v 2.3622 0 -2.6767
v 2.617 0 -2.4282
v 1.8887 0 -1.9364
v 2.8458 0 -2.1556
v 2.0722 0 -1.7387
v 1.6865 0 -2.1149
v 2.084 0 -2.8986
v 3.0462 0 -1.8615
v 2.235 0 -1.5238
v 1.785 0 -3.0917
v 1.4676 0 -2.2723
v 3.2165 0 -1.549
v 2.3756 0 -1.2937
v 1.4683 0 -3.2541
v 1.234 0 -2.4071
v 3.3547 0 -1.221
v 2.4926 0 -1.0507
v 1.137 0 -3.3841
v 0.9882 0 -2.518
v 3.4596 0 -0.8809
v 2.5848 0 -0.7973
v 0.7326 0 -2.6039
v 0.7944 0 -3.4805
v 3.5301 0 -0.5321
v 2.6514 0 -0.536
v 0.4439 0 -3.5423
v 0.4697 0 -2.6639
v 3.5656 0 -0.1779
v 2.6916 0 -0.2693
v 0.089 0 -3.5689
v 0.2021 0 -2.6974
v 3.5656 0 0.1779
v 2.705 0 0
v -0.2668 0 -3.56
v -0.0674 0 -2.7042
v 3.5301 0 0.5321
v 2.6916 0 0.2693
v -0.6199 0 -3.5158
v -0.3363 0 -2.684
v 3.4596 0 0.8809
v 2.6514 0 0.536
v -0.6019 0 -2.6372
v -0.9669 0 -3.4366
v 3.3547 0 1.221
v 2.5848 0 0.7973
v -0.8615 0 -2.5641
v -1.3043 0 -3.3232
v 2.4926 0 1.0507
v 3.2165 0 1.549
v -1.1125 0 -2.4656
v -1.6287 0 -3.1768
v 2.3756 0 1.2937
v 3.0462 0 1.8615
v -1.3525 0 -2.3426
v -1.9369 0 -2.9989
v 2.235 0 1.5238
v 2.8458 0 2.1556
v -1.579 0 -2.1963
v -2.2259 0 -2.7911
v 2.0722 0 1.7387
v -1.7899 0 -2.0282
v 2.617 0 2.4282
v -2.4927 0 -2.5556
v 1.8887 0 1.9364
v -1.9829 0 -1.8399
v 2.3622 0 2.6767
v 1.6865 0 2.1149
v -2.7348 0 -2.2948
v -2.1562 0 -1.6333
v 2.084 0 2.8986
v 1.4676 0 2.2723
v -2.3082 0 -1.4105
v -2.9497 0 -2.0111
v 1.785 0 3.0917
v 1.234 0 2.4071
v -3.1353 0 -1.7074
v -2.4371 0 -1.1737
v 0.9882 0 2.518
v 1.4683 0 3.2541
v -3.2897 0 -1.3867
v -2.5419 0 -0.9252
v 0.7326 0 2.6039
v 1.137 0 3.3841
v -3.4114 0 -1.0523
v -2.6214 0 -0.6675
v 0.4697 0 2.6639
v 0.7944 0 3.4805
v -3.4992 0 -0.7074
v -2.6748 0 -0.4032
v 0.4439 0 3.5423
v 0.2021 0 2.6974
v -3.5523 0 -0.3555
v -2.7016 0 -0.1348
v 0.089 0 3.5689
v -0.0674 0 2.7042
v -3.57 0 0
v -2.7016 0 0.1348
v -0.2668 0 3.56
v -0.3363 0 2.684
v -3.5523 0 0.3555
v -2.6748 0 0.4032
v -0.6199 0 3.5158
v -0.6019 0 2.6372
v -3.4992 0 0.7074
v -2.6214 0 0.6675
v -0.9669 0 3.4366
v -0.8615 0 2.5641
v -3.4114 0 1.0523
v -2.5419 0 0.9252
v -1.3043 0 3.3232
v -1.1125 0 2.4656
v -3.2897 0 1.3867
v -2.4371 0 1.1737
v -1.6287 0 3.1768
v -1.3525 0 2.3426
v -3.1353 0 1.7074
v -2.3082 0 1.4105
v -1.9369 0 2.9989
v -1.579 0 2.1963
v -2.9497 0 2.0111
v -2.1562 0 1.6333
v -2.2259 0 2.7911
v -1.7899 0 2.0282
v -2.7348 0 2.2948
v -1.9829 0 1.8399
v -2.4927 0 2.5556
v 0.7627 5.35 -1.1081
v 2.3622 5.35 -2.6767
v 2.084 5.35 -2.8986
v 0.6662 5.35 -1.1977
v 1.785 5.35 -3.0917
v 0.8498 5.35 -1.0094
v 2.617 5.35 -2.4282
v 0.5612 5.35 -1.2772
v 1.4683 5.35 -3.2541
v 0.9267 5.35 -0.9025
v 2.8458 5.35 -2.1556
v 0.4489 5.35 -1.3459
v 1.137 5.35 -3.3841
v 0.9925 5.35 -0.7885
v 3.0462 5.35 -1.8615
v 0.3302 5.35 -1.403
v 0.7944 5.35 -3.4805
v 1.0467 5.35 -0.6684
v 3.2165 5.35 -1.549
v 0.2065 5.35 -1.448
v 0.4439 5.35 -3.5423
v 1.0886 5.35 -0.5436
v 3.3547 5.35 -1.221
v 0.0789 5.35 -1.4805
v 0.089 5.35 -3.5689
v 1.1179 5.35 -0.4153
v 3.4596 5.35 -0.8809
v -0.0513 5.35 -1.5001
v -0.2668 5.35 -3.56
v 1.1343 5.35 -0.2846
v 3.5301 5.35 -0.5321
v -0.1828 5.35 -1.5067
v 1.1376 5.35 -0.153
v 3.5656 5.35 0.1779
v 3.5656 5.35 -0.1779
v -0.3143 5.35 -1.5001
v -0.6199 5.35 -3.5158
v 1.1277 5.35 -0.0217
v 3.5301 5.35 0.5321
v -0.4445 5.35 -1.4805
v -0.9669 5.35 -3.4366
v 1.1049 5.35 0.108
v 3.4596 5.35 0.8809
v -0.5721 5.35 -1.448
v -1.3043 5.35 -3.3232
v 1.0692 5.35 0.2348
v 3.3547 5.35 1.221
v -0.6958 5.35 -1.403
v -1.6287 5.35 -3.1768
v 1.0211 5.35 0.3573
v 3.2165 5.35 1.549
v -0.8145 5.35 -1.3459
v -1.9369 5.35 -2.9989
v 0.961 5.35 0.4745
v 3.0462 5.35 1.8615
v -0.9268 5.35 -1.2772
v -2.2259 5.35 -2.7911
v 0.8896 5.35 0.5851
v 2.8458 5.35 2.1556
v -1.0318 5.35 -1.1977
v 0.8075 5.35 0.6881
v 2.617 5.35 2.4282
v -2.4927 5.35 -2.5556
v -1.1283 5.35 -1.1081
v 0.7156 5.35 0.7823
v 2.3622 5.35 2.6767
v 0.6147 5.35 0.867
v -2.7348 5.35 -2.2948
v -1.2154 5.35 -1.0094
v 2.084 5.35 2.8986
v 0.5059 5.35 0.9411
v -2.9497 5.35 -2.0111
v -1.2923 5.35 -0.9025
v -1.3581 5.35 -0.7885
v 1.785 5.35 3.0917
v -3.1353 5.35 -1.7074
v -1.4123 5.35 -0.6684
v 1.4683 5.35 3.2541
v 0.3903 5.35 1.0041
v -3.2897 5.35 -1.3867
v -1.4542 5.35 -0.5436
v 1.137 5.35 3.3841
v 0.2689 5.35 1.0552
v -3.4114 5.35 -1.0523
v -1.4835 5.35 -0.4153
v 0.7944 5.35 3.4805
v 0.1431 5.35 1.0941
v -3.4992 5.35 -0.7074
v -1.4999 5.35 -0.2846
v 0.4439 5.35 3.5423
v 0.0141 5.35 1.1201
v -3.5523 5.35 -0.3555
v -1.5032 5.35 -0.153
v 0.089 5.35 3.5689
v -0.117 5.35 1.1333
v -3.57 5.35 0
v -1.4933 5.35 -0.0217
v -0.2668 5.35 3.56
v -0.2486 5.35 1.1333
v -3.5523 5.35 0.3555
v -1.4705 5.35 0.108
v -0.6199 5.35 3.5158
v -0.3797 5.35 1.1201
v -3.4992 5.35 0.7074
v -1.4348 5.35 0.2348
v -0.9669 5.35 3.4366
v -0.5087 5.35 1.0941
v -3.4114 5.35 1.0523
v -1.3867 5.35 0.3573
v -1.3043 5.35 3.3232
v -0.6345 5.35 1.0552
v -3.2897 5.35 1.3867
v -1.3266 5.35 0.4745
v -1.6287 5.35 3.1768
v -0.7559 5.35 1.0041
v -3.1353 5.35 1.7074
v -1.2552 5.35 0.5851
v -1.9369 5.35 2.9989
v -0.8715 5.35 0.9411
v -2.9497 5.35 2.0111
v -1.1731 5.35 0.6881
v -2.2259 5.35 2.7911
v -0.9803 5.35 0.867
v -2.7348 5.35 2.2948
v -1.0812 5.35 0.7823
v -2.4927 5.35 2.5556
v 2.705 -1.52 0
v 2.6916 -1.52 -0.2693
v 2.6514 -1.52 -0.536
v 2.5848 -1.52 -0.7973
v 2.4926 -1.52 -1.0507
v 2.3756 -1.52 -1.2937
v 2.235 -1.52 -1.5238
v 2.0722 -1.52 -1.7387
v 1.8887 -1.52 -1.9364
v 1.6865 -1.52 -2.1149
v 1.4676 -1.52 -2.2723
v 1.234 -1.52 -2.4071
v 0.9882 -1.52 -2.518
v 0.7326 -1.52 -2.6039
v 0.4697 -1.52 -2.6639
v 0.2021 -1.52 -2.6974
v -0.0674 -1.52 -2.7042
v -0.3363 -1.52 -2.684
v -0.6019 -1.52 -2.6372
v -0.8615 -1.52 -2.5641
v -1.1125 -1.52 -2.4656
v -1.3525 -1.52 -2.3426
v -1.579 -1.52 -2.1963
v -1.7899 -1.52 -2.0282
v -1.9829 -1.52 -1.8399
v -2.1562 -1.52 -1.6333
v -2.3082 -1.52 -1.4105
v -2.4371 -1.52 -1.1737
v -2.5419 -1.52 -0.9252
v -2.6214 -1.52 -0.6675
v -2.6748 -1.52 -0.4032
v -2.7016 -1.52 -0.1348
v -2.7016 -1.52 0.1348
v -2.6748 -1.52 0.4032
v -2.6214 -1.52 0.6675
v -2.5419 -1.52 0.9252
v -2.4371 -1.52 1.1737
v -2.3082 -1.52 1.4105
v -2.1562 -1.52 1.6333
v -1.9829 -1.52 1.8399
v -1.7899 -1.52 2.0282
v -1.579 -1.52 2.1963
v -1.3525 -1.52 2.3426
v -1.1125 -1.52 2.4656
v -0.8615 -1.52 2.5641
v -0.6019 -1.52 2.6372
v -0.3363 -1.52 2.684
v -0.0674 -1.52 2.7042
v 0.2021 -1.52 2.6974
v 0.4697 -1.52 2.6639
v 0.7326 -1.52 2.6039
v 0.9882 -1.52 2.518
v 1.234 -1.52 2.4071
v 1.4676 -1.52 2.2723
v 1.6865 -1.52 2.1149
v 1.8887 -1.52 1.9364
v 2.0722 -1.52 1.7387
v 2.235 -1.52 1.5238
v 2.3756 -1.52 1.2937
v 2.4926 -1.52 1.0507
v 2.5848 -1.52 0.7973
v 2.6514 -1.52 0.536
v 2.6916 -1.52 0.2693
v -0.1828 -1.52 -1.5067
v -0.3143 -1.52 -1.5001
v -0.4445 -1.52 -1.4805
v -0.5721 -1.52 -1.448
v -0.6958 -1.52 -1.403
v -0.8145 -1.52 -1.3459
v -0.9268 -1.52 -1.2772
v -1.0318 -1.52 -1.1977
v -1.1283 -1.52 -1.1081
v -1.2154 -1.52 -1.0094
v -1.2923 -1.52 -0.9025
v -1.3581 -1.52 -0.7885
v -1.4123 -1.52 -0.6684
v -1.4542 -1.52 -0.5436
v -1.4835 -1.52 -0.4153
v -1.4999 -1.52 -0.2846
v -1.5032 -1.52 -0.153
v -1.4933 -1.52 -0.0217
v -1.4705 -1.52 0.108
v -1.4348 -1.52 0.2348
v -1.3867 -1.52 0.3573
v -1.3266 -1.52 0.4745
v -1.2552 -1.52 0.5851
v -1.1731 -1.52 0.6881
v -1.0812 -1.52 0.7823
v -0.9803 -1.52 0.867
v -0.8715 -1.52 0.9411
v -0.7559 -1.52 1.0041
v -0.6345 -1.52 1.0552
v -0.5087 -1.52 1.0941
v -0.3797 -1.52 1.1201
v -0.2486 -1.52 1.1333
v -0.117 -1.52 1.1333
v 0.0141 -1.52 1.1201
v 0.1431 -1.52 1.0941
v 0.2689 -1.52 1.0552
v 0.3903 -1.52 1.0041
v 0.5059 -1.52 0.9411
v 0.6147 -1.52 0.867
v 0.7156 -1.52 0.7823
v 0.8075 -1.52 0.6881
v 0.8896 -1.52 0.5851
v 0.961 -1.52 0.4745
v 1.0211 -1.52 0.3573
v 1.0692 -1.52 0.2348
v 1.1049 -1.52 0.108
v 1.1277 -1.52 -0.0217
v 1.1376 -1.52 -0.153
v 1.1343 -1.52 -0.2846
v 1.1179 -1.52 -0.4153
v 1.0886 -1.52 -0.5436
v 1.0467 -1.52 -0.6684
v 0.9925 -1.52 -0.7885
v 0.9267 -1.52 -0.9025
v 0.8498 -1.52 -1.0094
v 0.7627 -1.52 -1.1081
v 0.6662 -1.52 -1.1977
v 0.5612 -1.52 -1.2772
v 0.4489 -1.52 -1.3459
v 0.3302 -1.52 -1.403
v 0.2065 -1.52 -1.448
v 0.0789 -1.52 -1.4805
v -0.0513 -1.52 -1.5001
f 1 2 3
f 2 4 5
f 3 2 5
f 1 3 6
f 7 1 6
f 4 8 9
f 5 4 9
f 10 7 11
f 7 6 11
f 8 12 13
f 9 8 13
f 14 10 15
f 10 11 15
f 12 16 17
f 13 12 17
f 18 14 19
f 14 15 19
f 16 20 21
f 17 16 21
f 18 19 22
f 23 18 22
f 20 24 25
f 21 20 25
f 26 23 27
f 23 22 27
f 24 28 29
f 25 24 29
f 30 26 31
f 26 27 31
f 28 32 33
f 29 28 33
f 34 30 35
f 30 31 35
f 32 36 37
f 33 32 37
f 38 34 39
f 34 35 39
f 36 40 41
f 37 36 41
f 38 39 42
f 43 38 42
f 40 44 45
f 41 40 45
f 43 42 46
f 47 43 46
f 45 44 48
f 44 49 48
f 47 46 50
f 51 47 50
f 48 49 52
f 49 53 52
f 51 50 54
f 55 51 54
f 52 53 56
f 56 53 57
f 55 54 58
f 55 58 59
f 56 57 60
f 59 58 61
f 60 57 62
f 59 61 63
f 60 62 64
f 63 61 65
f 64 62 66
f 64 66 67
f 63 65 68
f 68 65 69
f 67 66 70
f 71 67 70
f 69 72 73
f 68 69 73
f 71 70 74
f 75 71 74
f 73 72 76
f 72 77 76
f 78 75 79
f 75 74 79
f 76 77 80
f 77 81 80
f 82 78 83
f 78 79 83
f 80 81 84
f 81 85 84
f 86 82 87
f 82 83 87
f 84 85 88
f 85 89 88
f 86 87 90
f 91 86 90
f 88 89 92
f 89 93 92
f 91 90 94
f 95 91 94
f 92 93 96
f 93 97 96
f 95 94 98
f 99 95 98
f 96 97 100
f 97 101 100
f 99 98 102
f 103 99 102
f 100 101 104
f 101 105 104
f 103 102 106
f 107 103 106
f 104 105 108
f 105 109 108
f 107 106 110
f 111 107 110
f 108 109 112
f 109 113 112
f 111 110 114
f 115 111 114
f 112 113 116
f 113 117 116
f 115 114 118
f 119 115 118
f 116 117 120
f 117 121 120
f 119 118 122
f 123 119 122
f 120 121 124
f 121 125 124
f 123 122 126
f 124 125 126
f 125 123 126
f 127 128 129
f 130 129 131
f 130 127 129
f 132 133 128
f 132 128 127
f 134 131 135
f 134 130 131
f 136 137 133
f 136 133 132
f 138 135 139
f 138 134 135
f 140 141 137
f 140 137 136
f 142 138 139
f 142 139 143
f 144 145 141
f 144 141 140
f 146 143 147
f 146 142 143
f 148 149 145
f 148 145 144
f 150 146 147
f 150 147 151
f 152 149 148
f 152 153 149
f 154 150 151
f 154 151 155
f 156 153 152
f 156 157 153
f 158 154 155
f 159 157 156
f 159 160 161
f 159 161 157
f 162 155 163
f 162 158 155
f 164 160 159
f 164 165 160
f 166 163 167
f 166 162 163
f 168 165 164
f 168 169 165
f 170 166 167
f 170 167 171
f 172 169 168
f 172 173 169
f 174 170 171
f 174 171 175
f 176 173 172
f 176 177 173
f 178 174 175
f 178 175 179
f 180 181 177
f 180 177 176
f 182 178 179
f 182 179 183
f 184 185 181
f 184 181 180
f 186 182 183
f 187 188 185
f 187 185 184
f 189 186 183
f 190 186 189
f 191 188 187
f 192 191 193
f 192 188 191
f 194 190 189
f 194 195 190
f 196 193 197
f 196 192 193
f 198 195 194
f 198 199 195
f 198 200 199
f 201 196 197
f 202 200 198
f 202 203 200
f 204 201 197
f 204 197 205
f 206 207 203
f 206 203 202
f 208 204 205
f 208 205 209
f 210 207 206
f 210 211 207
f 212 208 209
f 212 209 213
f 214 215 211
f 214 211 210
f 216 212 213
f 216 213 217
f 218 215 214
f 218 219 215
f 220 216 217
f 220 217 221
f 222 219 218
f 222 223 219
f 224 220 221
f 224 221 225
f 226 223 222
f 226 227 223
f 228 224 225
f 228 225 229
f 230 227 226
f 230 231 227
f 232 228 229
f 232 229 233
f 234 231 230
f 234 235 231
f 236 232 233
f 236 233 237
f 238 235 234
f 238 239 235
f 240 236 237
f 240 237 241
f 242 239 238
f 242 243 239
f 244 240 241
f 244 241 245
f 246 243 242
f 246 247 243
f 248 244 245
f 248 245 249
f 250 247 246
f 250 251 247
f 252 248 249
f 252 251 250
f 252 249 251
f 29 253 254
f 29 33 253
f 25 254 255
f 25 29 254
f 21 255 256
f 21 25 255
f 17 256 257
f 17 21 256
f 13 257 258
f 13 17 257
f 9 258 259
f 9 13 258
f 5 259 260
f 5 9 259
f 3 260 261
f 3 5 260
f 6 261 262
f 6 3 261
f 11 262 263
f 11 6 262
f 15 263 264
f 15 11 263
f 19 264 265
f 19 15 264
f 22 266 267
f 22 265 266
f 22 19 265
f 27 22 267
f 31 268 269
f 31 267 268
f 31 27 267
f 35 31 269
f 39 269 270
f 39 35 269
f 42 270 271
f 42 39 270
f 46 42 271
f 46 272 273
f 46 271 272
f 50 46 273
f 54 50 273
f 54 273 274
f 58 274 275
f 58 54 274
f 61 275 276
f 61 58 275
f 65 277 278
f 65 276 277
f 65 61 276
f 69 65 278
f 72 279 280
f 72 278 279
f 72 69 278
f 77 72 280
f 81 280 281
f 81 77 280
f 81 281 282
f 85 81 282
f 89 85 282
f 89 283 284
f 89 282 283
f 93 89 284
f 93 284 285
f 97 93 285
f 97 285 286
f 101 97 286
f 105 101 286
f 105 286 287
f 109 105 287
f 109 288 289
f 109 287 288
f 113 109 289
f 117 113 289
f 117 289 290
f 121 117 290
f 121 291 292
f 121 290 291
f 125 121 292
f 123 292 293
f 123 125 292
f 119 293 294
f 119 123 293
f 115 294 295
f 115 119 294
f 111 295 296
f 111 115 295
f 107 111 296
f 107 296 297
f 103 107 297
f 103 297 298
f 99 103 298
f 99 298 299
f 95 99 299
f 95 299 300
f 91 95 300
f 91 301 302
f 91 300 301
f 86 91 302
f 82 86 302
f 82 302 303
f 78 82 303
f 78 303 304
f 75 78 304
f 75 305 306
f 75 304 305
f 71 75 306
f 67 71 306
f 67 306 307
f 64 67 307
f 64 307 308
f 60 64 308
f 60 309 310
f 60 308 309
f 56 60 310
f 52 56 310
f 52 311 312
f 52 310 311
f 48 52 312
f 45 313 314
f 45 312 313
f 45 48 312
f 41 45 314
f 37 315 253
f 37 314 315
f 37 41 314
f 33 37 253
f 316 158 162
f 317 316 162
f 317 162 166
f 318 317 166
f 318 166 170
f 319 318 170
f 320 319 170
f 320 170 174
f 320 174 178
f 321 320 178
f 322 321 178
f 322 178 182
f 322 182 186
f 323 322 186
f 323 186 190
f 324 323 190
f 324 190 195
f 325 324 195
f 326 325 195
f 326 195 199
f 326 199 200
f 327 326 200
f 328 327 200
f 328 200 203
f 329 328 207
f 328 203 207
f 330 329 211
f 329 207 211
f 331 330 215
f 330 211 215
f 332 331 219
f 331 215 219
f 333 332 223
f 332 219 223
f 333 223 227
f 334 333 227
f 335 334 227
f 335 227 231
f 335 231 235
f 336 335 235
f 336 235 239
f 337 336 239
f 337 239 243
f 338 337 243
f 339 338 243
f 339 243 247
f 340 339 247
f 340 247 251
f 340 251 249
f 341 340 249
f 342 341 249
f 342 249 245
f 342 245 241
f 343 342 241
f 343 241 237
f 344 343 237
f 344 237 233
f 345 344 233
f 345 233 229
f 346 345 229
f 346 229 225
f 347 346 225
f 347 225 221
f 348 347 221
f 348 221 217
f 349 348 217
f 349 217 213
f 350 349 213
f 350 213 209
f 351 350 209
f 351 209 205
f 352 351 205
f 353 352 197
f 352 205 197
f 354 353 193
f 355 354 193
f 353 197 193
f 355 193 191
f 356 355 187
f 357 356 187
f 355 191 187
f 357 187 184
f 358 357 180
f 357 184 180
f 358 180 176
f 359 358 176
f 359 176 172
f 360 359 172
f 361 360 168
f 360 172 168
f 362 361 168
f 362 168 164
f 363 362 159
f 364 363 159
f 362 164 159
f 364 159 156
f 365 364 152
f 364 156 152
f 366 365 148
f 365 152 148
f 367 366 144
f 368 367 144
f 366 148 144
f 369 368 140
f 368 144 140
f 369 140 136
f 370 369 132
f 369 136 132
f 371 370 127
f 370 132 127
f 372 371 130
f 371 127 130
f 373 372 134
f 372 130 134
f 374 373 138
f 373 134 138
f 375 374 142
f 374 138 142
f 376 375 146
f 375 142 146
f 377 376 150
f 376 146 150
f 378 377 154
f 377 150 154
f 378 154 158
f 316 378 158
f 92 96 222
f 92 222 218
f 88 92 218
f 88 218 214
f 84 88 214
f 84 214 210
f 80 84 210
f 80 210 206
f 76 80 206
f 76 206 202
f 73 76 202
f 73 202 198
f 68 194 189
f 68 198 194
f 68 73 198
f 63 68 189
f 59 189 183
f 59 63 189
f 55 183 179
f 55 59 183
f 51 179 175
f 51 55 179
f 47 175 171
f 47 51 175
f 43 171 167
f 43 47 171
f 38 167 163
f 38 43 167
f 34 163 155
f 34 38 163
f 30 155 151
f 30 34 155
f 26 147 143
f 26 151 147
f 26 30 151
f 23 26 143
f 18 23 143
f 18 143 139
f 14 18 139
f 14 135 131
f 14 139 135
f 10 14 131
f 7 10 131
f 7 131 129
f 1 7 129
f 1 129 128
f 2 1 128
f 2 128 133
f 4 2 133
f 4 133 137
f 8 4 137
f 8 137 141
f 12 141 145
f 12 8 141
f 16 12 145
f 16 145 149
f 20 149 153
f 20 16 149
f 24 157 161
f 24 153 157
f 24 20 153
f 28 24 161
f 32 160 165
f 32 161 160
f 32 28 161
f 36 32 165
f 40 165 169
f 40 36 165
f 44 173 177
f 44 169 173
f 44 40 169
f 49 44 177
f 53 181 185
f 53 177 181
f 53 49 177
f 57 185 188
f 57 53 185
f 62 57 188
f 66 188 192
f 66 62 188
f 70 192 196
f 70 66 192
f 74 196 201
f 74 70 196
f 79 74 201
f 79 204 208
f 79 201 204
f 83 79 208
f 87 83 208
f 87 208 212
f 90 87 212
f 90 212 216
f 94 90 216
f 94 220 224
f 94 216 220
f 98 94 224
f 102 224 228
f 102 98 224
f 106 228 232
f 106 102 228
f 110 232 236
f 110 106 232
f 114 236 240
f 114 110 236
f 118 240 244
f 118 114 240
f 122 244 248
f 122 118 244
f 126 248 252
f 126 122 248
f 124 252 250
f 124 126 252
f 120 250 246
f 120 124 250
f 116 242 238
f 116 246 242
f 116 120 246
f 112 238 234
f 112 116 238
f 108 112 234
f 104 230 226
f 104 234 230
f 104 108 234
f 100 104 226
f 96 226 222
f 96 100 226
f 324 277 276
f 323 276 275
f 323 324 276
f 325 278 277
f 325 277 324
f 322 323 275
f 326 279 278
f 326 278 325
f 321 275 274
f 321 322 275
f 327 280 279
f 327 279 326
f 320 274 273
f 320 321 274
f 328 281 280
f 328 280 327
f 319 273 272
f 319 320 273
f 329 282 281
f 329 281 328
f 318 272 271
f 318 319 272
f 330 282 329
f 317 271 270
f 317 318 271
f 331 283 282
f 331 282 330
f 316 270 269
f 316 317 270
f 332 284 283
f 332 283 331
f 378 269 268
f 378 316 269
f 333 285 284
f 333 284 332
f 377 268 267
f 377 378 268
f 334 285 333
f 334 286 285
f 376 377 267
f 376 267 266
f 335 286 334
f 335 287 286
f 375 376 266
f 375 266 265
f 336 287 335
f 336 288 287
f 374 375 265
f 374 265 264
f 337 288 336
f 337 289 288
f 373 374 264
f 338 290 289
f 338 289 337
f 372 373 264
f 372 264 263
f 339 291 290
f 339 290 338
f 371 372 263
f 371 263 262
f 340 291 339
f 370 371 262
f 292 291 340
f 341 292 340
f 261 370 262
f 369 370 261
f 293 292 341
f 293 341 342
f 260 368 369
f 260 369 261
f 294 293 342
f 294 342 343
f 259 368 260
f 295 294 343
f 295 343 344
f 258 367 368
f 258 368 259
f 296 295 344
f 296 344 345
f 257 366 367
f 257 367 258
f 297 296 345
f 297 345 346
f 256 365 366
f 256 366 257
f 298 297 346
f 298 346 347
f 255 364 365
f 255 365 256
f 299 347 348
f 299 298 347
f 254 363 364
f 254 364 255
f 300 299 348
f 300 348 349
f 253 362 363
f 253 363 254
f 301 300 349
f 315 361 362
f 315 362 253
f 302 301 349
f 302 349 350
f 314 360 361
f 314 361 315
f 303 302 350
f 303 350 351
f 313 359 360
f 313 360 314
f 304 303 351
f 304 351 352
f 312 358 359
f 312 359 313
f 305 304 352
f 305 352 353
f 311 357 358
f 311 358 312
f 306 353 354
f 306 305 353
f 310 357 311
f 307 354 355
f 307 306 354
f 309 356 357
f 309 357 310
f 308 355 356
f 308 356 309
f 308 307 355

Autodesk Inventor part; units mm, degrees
ref_plane "YZ Plane" through (0, 0, 0) normal (1, 0, 0) x (0, 1, 0)
ref_plane "XZ Plane" through (0, 0, 0) normal (0, 1, 0) x (-1, 0, 0)
ref_plane "XY Plane" through (0, 0, 0) normal (0, 0, 1) x (1, 0, 0)
sketch "Sketch1" plane through (0, 0, 0) normal (0, 1, 0) x (-1, 0, 0)
  circle A0 centre (0, 0) radius 3.57
  dimension "d0" = 7.14
extrude "Extrusion1" add sketch "Sketch1" along normal blind 5.35
sketch "Sketch2" plane through (0, 0, 0) normal (0, -1, 0) x (1, 0, 0)
  circle A0 centre (0, 0) radius 2.705
  dimension "d3" = 5.41
extrude "Extrusion2" add sketch "Sketch2" along normal blind 1.52
sketch "Sketch3" plane through (0, -1.52, 0) normal (0, -1, 0) x (1, 0, 0)
  point P0 (0, 0)
  point P1 (-0.1828, -0.1859)
hole "Hole1" at (-0.1828, -1.52, -0.1859) direction (0, 1, 0) diameter 2.6416 end through all thread size "6-32 UNC" class "2B" standard "ANSI Unified Screw Threads"
properties part number "spacer"
